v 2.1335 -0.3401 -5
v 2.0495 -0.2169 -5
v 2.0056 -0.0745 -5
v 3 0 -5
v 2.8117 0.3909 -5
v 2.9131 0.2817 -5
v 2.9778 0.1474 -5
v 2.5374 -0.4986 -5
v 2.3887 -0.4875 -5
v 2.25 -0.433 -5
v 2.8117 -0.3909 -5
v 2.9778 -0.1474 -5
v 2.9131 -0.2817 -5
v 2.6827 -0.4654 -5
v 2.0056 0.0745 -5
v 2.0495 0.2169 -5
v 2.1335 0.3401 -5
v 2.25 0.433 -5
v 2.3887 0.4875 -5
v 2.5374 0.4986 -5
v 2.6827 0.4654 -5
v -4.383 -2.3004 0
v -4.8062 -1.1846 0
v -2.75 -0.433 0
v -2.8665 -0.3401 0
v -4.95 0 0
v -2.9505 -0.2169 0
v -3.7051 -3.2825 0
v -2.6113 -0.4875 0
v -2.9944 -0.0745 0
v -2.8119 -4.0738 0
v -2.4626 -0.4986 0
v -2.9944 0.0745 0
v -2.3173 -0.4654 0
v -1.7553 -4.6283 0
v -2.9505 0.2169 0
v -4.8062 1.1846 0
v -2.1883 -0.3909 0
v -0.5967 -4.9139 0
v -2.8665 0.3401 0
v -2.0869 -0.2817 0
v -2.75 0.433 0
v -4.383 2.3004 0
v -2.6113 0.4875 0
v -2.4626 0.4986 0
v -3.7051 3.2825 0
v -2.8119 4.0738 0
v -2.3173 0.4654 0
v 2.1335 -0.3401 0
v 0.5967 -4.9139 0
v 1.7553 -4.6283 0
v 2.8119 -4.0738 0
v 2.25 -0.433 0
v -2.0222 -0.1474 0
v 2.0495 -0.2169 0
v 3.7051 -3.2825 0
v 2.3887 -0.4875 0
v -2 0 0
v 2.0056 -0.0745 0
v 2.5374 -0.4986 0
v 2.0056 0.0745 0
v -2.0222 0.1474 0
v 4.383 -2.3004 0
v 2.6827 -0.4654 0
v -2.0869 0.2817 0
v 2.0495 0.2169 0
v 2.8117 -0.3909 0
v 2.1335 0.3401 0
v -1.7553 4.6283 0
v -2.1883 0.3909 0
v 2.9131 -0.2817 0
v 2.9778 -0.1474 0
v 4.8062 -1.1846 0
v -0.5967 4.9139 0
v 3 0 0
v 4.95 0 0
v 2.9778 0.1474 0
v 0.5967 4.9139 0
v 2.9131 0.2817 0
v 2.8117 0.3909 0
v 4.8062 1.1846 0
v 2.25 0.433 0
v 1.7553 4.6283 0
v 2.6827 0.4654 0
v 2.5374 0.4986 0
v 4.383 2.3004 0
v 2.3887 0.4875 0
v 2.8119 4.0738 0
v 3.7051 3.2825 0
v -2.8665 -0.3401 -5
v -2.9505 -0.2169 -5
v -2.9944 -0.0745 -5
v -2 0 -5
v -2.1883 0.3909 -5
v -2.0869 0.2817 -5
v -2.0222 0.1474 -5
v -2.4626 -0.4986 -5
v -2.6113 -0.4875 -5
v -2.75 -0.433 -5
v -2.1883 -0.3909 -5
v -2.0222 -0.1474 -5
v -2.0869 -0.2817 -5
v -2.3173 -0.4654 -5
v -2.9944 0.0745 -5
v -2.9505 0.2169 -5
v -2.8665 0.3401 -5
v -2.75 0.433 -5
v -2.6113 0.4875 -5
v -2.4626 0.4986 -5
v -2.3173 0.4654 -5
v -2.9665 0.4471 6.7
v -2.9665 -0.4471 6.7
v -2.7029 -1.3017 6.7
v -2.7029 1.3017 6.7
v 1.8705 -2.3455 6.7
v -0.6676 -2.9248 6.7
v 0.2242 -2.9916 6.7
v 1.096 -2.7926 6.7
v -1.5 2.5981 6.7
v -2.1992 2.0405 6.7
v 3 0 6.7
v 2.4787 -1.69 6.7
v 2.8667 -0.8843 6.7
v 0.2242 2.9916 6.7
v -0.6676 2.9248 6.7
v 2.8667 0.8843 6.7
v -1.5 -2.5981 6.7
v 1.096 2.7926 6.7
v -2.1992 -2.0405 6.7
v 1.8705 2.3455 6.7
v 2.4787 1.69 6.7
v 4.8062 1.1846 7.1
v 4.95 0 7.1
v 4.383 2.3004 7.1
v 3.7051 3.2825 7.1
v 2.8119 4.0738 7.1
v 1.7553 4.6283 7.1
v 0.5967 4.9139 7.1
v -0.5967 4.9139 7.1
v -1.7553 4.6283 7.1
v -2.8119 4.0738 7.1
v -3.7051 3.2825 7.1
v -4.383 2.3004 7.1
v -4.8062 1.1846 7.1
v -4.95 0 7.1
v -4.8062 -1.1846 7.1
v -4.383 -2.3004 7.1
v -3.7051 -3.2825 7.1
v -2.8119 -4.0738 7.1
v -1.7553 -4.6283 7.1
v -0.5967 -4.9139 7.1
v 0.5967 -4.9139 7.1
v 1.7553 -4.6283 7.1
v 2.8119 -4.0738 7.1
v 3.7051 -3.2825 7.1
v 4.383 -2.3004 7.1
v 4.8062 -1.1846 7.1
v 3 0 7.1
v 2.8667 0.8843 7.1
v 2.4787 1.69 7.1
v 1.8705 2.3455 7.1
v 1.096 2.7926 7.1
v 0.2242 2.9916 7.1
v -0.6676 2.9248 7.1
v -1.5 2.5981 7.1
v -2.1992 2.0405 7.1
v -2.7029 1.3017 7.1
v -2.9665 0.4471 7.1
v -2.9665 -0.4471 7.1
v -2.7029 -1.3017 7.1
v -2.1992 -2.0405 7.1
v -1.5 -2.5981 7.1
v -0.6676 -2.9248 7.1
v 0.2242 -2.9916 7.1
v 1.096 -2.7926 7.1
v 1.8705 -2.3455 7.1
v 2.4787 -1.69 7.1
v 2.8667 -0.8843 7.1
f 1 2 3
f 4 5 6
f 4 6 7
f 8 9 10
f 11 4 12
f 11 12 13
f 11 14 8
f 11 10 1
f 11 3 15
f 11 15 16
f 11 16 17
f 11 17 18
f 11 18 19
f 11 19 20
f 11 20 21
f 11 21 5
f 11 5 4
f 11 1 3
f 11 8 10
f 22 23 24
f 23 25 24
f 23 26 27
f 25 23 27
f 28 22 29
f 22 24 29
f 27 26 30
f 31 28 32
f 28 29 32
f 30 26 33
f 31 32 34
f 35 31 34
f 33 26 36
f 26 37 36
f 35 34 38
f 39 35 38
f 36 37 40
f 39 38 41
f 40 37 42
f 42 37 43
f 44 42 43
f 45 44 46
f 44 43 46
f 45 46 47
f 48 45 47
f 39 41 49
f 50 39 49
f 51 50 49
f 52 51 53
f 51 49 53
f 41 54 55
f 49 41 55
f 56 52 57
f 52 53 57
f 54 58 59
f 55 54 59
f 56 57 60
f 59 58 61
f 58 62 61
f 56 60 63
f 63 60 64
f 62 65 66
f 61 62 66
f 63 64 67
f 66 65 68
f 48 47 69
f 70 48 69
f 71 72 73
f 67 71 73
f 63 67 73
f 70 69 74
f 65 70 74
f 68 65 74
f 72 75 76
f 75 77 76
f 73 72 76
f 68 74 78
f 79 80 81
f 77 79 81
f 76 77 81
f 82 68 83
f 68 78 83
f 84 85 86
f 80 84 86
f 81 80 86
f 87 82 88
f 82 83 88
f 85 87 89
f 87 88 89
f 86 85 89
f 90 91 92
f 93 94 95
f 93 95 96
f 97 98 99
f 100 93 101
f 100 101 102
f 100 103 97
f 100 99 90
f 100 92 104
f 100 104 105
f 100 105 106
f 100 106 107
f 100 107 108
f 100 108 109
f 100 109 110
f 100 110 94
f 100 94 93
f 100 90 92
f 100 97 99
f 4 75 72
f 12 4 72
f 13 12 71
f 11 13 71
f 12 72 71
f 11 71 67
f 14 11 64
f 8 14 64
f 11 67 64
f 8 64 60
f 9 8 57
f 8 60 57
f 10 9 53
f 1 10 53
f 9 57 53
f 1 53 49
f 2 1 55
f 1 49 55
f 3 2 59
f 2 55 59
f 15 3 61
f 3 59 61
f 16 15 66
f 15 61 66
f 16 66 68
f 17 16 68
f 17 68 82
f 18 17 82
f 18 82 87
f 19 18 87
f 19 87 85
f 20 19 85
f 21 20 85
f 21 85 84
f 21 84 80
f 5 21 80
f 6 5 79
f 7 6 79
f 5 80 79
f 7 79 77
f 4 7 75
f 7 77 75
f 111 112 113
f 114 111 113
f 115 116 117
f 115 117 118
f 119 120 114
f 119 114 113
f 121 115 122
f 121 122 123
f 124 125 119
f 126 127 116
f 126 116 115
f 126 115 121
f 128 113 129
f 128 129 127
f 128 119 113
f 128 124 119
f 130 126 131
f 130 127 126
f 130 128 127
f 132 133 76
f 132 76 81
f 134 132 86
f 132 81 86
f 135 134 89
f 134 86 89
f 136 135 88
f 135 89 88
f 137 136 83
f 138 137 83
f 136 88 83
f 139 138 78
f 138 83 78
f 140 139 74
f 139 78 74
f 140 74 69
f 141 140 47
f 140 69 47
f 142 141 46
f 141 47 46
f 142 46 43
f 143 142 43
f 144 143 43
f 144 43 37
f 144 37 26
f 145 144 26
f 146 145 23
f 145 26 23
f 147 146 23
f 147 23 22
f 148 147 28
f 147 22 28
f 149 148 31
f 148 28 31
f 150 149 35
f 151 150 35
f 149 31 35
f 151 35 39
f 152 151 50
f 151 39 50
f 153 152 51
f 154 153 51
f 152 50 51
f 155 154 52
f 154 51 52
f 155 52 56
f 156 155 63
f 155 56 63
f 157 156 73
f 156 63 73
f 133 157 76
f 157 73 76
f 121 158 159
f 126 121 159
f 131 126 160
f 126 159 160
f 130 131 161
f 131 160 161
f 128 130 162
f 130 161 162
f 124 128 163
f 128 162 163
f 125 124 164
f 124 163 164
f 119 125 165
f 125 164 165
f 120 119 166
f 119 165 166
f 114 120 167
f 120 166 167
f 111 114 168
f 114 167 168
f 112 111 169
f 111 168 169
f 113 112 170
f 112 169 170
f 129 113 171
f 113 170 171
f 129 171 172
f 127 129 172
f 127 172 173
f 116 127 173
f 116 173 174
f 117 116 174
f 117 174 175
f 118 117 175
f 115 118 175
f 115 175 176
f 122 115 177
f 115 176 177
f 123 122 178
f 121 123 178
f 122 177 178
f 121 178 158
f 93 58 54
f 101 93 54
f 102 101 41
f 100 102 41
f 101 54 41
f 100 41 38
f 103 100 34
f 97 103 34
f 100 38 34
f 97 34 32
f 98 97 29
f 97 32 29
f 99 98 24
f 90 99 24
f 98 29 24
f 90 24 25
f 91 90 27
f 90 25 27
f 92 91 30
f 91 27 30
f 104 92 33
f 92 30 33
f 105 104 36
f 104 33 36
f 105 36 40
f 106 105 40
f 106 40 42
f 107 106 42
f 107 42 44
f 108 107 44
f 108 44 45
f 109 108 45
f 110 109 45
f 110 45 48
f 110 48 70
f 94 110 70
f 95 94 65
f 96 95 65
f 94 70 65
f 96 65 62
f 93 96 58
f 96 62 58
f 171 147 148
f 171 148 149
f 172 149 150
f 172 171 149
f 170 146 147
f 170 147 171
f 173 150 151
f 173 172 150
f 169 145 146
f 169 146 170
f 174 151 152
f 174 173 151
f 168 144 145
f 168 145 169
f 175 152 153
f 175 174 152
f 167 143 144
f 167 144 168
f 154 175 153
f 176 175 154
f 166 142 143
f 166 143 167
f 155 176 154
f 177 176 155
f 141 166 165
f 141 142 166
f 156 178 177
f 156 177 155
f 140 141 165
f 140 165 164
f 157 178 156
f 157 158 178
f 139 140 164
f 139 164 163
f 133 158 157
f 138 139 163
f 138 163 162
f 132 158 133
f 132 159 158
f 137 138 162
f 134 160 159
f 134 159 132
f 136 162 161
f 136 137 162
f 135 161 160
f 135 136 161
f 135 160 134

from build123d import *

# Parameters (mm, degrees)
SKETCH_R     = 4.95
PAD_DEPTH    = 7.1
SKETCH001_R  = 0.5
PAD001_DEPTH = 5
SKETCH002_R  = 3
POCKET_DEPTH = 0.4


with BuildPart() as part:
    # Sketch → Pad (new body)
    with BuildSketch(Plane.XY):
        Circle(SKETCH_R)
    extrude(amount=PAD_DEPTH)

    # Sketch001 → Pad001 (new body)
    with BuildSketch(Plane(origin=(0, 0, 0), x_dir=(1, 0, 0), z_dir=(0, 0, -1))):
        with Locations((2.5, 0)):
            Circle(SKETCH001_R)
        with Locations((-2.5, 0)):
            Circle(SKETCH001_R)
    extrude(amount=PAD001_DEPTH)

    # Sketch002 → Pocket (cut)
    with BuildSketch(Plane.XY.offset(7.1)):
        Circle(SKETCH002_R)
    extrude(amount=-POCKET_DEPTH, mode=Mode.SUBTRACT)


solid = part.part
